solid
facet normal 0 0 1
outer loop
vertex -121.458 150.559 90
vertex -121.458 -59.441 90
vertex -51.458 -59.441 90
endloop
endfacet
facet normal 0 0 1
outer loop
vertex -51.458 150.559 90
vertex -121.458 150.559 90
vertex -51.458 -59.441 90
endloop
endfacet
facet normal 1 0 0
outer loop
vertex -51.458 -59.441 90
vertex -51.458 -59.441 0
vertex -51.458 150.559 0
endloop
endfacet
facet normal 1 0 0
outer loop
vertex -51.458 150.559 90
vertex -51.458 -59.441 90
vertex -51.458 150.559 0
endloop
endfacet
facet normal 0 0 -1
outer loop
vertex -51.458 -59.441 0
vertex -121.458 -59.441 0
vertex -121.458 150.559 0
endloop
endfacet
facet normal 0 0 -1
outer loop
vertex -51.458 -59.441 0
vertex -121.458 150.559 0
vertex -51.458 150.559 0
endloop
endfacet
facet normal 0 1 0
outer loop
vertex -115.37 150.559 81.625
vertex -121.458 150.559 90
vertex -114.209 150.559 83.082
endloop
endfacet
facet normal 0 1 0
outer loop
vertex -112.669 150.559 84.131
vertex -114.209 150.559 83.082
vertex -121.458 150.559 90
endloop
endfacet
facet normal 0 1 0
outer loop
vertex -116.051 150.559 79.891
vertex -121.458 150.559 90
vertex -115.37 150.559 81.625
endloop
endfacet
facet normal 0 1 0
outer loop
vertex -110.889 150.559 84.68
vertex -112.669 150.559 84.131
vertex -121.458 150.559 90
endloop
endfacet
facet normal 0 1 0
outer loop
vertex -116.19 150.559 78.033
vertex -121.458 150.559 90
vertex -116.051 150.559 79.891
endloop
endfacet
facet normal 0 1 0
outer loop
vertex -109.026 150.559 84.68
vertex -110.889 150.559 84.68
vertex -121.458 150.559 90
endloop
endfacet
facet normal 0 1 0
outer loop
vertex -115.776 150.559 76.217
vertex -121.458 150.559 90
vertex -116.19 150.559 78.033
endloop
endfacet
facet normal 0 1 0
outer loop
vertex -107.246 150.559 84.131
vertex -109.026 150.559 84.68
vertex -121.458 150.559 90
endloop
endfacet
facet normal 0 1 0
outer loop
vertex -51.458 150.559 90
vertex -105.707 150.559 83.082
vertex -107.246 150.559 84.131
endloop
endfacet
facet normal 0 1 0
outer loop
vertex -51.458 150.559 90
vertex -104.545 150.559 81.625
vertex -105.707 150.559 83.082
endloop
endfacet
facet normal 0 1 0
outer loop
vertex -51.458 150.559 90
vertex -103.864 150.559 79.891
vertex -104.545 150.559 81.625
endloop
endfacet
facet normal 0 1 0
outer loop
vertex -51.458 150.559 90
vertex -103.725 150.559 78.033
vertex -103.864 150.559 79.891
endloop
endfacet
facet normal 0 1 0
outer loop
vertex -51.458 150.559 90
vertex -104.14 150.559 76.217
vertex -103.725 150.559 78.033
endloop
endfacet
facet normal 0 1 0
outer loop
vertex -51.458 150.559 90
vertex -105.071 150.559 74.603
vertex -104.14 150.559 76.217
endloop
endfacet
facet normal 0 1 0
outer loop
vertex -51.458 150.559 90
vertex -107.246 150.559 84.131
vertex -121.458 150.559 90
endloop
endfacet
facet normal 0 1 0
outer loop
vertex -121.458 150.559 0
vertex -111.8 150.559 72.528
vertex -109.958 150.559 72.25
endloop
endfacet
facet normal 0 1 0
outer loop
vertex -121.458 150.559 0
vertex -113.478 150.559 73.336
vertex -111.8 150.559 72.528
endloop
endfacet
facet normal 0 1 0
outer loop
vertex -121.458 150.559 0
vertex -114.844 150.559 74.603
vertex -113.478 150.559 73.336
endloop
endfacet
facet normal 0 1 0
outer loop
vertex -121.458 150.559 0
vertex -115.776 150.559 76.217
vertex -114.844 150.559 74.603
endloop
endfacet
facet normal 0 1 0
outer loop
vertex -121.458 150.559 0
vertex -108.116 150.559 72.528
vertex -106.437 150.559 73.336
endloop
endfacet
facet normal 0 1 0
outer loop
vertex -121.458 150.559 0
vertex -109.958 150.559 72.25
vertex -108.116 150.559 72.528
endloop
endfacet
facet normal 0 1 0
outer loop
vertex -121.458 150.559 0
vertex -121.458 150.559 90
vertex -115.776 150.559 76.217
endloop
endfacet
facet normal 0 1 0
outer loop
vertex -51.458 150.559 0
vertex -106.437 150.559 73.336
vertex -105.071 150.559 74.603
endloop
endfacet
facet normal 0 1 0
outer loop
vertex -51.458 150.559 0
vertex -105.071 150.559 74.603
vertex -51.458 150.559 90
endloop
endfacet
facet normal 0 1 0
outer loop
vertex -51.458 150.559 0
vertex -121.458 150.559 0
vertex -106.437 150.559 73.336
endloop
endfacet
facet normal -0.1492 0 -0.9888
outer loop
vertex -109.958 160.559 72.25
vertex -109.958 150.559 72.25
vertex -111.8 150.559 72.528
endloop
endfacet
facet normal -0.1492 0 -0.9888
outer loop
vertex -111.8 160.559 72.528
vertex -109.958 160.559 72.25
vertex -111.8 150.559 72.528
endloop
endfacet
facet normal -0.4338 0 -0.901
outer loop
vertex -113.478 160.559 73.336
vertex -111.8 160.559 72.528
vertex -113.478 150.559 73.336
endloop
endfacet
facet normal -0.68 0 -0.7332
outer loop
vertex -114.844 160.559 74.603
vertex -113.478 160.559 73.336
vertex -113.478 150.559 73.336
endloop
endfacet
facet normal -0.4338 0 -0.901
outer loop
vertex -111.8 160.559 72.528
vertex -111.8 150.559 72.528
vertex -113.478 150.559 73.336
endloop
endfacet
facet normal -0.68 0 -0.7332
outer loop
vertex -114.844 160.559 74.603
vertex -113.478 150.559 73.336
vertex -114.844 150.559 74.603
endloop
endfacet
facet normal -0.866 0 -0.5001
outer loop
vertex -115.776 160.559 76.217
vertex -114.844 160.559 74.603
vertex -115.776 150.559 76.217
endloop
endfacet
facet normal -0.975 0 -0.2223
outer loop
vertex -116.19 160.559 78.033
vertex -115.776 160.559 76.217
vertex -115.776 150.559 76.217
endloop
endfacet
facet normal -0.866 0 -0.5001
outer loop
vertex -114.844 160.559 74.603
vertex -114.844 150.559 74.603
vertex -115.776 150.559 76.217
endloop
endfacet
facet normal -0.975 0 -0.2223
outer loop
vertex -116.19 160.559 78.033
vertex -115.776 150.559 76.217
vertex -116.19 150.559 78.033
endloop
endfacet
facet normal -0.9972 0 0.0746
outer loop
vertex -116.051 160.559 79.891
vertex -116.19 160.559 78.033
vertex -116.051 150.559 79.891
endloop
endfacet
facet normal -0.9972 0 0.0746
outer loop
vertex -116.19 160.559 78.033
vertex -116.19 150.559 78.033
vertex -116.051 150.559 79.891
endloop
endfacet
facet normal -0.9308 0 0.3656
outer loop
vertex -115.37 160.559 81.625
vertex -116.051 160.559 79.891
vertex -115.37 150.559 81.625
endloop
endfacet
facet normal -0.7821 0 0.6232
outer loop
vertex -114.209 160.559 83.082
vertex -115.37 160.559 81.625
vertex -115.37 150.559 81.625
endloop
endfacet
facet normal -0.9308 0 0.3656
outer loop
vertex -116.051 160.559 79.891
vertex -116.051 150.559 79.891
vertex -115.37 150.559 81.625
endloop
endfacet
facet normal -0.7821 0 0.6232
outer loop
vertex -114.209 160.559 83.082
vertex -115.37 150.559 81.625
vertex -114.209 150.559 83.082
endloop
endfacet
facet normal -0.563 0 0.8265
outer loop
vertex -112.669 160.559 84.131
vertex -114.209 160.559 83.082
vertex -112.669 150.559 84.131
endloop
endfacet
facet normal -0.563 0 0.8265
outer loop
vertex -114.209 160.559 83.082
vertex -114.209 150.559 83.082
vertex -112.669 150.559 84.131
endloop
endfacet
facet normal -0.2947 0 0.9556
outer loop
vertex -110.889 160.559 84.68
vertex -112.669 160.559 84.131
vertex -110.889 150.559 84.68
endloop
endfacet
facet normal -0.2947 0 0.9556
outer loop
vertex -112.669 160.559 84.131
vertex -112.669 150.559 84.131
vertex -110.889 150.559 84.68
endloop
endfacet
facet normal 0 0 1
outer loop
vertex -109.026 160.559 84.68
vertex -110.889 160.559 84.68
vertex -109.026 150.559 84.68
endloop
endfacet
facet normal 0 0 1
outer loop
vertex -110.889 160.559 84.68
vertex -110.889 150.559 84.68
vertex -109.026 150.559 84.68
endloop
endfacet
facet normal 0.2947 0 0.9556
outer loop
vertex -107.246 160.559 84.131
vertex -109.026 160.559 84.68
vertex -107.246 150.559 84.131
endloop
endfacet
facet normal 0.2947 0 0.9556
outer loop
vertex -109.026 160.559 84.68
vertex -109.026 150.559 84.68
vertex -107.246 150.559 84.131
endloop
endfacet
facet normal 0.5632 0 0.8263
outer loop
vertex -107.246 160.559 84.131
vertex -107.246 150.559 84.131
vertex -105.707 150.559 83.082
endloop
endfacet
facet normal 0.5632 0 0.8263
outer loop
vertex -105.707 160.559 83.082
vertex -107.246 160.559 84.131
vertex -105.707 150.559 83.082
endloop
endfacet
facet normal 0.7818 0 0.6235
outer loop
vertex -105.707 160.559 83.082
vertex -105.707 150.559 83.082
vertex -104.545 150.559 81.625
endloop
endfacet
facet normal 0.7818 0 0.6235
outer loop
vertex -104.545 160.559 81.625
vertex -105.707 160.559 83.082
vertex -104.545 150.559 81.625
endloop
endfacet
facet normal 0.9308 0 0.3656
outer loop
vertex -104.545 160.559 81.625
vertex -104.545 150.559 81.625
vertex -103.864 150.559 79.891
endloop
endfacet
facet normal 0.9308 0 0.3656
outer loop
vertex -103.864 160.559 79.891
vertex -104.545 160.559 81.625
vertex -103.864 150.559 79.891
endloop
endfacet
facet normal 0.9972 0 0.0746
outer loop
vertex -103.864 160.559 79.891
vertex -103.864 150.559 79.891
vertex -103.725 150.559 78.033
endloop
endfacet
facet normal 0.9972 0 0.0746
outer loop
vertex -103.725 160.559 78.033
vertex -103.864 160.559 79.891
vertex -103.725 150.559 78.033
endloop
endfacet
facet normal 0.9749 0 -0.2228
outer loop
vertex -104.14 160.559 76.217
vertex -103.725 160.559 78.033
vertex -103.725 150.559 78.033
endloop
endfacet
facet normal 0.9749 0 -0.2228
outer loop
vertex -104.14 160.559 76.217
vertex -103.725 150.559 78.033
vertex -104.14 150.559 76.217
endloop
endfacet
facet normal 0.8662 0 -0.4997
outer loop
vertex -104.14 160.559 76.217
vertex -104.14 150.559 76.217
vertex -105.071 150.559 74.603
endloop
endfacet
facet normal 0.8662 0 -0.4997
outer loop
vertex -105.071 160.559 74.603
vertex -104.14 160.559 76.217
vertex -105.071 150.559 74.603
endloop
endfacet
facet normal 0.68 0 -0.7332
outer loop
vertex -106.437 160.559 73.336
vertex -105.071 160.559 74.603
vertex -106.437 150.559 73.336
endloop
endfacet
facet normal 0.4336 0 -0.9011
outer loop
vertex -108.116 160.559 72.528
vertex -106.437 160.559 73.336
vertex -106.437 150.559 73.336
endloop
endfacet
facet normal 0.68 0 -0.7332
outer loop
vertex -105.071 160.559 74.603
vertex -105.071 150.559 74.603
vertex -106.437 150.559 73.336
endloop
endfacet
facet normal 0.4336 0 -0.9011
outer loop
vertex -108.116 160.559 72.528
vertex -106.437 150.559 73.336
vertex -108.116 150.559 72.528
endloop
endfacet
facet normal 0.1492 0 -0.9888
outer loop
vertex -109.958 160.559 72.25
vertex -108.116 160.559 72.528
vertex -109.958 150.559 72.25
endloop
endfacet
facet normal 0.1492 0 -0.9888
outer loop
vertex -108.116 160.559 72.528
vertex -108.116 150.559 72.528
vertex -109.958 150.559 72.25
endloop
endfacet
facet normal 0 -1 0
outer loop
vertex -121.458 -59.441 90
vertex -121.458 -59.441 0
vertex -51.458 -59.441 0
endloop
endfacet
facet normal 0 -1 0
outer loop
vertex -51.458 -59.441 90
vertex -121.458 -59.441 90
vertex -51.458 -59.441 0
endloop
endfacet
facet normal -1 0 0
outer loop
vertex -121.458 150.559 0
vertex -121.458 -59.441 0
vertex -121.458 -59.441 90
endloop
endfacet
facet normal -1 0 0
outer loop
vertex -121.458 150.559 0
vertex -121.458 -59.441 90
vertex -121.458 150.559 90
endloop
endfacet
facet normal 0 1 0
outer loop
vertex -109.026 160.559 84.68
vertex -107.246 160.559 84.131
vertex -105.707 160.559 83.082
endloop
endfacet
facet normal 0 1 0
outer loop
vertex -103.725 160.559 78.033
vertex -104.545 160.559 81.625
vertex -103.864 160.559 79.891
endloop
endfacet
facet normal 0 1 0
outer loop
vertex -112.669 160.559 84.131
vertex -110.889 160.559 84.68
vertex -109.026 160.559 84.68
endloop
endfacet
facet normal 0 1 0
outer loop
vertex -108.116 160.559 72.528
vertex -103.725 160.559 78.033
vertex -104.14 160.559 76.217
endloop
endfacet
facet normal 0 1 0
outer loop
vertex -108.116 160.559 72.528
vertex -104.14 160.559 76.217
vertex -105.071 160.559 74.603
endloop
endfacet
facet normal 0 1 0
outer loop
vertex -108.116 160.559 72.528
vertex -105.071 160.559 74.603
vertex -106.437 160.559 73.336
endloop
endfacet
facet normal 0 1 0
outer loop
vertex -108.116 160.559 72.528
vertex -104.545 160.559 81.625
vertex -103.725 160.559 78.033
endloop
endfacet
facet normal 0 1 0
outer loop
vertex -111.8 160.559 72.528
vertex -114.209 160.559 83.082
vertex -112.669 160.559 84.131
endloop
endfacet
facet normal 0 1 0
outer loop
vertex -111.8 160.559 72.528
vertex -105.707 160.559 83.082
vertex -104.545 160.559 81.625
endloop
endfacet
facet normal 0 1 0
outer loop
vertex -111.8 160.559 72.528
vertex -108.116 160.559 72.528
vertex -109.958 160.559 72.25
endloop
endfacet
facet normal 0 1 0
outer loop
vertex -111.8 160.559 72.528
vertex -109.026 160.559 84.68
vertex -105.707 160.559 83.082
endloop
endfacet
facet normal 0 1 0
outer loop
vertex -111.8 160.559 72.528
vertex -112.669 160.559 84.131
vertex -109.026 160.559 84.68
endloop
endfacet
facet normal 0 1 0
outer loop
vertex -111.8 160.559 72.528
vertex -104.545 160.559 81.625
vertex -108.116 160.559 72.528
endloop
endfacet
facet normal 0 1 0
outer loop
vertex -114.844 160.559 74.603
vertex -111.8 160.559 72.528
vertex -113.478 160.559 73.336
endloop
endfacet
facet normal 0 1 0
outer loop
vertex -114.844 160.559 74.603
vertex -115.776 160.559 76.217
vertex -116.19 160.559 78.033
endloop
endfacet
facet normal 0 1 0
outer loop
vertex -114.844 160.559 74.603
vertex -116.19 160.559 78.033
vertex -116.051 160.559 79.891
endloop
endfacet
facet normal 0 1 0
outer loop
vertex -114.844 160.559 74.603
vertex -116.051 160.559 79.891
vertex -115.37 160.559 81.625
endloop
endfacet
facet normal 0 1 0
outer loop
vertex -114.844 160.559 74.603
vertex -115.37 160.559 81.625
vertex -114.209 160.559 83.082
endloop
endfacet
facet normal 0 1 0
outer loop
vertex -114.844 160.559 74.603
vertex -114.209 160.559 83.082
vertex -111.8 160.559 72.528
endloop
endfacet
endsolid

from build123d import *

# Parameters (mm, degrees)
SKETCH1_W             = 70
SKETCH1_H             = 210
LV_BATTRY_DEPTH       = 90
SKETCH2_R             = 6.25
CABLES_3X_14AWG_DEPTH = 10


with BuildPart() as part:
    # Sketch1 → LV Battry (new body)
    with BuildSketch(Plane.XY):
        with Locations((-86.457724765, 45.558894231)):
            Rectangle(SKETCH1_W, SKETCH1_H)
    extrude(amount=LV_BATTRY_DEPTH)

    # Sketch2 → Cables (3x 14AWG) (add)
    with BuildSketch(Plane(origin=(0, 150.558894231, 0), x_dir=(1, 0, 0), z_dir=(0, 1, 0))):
        with Locations(Location((-109.957724765, -78.5, 0), (0, 0, 90))):
            Circle(SKETCH2_R)
    extrude(amount=CABLES_3X_14AWG_DEPTH)


solid = part.part
